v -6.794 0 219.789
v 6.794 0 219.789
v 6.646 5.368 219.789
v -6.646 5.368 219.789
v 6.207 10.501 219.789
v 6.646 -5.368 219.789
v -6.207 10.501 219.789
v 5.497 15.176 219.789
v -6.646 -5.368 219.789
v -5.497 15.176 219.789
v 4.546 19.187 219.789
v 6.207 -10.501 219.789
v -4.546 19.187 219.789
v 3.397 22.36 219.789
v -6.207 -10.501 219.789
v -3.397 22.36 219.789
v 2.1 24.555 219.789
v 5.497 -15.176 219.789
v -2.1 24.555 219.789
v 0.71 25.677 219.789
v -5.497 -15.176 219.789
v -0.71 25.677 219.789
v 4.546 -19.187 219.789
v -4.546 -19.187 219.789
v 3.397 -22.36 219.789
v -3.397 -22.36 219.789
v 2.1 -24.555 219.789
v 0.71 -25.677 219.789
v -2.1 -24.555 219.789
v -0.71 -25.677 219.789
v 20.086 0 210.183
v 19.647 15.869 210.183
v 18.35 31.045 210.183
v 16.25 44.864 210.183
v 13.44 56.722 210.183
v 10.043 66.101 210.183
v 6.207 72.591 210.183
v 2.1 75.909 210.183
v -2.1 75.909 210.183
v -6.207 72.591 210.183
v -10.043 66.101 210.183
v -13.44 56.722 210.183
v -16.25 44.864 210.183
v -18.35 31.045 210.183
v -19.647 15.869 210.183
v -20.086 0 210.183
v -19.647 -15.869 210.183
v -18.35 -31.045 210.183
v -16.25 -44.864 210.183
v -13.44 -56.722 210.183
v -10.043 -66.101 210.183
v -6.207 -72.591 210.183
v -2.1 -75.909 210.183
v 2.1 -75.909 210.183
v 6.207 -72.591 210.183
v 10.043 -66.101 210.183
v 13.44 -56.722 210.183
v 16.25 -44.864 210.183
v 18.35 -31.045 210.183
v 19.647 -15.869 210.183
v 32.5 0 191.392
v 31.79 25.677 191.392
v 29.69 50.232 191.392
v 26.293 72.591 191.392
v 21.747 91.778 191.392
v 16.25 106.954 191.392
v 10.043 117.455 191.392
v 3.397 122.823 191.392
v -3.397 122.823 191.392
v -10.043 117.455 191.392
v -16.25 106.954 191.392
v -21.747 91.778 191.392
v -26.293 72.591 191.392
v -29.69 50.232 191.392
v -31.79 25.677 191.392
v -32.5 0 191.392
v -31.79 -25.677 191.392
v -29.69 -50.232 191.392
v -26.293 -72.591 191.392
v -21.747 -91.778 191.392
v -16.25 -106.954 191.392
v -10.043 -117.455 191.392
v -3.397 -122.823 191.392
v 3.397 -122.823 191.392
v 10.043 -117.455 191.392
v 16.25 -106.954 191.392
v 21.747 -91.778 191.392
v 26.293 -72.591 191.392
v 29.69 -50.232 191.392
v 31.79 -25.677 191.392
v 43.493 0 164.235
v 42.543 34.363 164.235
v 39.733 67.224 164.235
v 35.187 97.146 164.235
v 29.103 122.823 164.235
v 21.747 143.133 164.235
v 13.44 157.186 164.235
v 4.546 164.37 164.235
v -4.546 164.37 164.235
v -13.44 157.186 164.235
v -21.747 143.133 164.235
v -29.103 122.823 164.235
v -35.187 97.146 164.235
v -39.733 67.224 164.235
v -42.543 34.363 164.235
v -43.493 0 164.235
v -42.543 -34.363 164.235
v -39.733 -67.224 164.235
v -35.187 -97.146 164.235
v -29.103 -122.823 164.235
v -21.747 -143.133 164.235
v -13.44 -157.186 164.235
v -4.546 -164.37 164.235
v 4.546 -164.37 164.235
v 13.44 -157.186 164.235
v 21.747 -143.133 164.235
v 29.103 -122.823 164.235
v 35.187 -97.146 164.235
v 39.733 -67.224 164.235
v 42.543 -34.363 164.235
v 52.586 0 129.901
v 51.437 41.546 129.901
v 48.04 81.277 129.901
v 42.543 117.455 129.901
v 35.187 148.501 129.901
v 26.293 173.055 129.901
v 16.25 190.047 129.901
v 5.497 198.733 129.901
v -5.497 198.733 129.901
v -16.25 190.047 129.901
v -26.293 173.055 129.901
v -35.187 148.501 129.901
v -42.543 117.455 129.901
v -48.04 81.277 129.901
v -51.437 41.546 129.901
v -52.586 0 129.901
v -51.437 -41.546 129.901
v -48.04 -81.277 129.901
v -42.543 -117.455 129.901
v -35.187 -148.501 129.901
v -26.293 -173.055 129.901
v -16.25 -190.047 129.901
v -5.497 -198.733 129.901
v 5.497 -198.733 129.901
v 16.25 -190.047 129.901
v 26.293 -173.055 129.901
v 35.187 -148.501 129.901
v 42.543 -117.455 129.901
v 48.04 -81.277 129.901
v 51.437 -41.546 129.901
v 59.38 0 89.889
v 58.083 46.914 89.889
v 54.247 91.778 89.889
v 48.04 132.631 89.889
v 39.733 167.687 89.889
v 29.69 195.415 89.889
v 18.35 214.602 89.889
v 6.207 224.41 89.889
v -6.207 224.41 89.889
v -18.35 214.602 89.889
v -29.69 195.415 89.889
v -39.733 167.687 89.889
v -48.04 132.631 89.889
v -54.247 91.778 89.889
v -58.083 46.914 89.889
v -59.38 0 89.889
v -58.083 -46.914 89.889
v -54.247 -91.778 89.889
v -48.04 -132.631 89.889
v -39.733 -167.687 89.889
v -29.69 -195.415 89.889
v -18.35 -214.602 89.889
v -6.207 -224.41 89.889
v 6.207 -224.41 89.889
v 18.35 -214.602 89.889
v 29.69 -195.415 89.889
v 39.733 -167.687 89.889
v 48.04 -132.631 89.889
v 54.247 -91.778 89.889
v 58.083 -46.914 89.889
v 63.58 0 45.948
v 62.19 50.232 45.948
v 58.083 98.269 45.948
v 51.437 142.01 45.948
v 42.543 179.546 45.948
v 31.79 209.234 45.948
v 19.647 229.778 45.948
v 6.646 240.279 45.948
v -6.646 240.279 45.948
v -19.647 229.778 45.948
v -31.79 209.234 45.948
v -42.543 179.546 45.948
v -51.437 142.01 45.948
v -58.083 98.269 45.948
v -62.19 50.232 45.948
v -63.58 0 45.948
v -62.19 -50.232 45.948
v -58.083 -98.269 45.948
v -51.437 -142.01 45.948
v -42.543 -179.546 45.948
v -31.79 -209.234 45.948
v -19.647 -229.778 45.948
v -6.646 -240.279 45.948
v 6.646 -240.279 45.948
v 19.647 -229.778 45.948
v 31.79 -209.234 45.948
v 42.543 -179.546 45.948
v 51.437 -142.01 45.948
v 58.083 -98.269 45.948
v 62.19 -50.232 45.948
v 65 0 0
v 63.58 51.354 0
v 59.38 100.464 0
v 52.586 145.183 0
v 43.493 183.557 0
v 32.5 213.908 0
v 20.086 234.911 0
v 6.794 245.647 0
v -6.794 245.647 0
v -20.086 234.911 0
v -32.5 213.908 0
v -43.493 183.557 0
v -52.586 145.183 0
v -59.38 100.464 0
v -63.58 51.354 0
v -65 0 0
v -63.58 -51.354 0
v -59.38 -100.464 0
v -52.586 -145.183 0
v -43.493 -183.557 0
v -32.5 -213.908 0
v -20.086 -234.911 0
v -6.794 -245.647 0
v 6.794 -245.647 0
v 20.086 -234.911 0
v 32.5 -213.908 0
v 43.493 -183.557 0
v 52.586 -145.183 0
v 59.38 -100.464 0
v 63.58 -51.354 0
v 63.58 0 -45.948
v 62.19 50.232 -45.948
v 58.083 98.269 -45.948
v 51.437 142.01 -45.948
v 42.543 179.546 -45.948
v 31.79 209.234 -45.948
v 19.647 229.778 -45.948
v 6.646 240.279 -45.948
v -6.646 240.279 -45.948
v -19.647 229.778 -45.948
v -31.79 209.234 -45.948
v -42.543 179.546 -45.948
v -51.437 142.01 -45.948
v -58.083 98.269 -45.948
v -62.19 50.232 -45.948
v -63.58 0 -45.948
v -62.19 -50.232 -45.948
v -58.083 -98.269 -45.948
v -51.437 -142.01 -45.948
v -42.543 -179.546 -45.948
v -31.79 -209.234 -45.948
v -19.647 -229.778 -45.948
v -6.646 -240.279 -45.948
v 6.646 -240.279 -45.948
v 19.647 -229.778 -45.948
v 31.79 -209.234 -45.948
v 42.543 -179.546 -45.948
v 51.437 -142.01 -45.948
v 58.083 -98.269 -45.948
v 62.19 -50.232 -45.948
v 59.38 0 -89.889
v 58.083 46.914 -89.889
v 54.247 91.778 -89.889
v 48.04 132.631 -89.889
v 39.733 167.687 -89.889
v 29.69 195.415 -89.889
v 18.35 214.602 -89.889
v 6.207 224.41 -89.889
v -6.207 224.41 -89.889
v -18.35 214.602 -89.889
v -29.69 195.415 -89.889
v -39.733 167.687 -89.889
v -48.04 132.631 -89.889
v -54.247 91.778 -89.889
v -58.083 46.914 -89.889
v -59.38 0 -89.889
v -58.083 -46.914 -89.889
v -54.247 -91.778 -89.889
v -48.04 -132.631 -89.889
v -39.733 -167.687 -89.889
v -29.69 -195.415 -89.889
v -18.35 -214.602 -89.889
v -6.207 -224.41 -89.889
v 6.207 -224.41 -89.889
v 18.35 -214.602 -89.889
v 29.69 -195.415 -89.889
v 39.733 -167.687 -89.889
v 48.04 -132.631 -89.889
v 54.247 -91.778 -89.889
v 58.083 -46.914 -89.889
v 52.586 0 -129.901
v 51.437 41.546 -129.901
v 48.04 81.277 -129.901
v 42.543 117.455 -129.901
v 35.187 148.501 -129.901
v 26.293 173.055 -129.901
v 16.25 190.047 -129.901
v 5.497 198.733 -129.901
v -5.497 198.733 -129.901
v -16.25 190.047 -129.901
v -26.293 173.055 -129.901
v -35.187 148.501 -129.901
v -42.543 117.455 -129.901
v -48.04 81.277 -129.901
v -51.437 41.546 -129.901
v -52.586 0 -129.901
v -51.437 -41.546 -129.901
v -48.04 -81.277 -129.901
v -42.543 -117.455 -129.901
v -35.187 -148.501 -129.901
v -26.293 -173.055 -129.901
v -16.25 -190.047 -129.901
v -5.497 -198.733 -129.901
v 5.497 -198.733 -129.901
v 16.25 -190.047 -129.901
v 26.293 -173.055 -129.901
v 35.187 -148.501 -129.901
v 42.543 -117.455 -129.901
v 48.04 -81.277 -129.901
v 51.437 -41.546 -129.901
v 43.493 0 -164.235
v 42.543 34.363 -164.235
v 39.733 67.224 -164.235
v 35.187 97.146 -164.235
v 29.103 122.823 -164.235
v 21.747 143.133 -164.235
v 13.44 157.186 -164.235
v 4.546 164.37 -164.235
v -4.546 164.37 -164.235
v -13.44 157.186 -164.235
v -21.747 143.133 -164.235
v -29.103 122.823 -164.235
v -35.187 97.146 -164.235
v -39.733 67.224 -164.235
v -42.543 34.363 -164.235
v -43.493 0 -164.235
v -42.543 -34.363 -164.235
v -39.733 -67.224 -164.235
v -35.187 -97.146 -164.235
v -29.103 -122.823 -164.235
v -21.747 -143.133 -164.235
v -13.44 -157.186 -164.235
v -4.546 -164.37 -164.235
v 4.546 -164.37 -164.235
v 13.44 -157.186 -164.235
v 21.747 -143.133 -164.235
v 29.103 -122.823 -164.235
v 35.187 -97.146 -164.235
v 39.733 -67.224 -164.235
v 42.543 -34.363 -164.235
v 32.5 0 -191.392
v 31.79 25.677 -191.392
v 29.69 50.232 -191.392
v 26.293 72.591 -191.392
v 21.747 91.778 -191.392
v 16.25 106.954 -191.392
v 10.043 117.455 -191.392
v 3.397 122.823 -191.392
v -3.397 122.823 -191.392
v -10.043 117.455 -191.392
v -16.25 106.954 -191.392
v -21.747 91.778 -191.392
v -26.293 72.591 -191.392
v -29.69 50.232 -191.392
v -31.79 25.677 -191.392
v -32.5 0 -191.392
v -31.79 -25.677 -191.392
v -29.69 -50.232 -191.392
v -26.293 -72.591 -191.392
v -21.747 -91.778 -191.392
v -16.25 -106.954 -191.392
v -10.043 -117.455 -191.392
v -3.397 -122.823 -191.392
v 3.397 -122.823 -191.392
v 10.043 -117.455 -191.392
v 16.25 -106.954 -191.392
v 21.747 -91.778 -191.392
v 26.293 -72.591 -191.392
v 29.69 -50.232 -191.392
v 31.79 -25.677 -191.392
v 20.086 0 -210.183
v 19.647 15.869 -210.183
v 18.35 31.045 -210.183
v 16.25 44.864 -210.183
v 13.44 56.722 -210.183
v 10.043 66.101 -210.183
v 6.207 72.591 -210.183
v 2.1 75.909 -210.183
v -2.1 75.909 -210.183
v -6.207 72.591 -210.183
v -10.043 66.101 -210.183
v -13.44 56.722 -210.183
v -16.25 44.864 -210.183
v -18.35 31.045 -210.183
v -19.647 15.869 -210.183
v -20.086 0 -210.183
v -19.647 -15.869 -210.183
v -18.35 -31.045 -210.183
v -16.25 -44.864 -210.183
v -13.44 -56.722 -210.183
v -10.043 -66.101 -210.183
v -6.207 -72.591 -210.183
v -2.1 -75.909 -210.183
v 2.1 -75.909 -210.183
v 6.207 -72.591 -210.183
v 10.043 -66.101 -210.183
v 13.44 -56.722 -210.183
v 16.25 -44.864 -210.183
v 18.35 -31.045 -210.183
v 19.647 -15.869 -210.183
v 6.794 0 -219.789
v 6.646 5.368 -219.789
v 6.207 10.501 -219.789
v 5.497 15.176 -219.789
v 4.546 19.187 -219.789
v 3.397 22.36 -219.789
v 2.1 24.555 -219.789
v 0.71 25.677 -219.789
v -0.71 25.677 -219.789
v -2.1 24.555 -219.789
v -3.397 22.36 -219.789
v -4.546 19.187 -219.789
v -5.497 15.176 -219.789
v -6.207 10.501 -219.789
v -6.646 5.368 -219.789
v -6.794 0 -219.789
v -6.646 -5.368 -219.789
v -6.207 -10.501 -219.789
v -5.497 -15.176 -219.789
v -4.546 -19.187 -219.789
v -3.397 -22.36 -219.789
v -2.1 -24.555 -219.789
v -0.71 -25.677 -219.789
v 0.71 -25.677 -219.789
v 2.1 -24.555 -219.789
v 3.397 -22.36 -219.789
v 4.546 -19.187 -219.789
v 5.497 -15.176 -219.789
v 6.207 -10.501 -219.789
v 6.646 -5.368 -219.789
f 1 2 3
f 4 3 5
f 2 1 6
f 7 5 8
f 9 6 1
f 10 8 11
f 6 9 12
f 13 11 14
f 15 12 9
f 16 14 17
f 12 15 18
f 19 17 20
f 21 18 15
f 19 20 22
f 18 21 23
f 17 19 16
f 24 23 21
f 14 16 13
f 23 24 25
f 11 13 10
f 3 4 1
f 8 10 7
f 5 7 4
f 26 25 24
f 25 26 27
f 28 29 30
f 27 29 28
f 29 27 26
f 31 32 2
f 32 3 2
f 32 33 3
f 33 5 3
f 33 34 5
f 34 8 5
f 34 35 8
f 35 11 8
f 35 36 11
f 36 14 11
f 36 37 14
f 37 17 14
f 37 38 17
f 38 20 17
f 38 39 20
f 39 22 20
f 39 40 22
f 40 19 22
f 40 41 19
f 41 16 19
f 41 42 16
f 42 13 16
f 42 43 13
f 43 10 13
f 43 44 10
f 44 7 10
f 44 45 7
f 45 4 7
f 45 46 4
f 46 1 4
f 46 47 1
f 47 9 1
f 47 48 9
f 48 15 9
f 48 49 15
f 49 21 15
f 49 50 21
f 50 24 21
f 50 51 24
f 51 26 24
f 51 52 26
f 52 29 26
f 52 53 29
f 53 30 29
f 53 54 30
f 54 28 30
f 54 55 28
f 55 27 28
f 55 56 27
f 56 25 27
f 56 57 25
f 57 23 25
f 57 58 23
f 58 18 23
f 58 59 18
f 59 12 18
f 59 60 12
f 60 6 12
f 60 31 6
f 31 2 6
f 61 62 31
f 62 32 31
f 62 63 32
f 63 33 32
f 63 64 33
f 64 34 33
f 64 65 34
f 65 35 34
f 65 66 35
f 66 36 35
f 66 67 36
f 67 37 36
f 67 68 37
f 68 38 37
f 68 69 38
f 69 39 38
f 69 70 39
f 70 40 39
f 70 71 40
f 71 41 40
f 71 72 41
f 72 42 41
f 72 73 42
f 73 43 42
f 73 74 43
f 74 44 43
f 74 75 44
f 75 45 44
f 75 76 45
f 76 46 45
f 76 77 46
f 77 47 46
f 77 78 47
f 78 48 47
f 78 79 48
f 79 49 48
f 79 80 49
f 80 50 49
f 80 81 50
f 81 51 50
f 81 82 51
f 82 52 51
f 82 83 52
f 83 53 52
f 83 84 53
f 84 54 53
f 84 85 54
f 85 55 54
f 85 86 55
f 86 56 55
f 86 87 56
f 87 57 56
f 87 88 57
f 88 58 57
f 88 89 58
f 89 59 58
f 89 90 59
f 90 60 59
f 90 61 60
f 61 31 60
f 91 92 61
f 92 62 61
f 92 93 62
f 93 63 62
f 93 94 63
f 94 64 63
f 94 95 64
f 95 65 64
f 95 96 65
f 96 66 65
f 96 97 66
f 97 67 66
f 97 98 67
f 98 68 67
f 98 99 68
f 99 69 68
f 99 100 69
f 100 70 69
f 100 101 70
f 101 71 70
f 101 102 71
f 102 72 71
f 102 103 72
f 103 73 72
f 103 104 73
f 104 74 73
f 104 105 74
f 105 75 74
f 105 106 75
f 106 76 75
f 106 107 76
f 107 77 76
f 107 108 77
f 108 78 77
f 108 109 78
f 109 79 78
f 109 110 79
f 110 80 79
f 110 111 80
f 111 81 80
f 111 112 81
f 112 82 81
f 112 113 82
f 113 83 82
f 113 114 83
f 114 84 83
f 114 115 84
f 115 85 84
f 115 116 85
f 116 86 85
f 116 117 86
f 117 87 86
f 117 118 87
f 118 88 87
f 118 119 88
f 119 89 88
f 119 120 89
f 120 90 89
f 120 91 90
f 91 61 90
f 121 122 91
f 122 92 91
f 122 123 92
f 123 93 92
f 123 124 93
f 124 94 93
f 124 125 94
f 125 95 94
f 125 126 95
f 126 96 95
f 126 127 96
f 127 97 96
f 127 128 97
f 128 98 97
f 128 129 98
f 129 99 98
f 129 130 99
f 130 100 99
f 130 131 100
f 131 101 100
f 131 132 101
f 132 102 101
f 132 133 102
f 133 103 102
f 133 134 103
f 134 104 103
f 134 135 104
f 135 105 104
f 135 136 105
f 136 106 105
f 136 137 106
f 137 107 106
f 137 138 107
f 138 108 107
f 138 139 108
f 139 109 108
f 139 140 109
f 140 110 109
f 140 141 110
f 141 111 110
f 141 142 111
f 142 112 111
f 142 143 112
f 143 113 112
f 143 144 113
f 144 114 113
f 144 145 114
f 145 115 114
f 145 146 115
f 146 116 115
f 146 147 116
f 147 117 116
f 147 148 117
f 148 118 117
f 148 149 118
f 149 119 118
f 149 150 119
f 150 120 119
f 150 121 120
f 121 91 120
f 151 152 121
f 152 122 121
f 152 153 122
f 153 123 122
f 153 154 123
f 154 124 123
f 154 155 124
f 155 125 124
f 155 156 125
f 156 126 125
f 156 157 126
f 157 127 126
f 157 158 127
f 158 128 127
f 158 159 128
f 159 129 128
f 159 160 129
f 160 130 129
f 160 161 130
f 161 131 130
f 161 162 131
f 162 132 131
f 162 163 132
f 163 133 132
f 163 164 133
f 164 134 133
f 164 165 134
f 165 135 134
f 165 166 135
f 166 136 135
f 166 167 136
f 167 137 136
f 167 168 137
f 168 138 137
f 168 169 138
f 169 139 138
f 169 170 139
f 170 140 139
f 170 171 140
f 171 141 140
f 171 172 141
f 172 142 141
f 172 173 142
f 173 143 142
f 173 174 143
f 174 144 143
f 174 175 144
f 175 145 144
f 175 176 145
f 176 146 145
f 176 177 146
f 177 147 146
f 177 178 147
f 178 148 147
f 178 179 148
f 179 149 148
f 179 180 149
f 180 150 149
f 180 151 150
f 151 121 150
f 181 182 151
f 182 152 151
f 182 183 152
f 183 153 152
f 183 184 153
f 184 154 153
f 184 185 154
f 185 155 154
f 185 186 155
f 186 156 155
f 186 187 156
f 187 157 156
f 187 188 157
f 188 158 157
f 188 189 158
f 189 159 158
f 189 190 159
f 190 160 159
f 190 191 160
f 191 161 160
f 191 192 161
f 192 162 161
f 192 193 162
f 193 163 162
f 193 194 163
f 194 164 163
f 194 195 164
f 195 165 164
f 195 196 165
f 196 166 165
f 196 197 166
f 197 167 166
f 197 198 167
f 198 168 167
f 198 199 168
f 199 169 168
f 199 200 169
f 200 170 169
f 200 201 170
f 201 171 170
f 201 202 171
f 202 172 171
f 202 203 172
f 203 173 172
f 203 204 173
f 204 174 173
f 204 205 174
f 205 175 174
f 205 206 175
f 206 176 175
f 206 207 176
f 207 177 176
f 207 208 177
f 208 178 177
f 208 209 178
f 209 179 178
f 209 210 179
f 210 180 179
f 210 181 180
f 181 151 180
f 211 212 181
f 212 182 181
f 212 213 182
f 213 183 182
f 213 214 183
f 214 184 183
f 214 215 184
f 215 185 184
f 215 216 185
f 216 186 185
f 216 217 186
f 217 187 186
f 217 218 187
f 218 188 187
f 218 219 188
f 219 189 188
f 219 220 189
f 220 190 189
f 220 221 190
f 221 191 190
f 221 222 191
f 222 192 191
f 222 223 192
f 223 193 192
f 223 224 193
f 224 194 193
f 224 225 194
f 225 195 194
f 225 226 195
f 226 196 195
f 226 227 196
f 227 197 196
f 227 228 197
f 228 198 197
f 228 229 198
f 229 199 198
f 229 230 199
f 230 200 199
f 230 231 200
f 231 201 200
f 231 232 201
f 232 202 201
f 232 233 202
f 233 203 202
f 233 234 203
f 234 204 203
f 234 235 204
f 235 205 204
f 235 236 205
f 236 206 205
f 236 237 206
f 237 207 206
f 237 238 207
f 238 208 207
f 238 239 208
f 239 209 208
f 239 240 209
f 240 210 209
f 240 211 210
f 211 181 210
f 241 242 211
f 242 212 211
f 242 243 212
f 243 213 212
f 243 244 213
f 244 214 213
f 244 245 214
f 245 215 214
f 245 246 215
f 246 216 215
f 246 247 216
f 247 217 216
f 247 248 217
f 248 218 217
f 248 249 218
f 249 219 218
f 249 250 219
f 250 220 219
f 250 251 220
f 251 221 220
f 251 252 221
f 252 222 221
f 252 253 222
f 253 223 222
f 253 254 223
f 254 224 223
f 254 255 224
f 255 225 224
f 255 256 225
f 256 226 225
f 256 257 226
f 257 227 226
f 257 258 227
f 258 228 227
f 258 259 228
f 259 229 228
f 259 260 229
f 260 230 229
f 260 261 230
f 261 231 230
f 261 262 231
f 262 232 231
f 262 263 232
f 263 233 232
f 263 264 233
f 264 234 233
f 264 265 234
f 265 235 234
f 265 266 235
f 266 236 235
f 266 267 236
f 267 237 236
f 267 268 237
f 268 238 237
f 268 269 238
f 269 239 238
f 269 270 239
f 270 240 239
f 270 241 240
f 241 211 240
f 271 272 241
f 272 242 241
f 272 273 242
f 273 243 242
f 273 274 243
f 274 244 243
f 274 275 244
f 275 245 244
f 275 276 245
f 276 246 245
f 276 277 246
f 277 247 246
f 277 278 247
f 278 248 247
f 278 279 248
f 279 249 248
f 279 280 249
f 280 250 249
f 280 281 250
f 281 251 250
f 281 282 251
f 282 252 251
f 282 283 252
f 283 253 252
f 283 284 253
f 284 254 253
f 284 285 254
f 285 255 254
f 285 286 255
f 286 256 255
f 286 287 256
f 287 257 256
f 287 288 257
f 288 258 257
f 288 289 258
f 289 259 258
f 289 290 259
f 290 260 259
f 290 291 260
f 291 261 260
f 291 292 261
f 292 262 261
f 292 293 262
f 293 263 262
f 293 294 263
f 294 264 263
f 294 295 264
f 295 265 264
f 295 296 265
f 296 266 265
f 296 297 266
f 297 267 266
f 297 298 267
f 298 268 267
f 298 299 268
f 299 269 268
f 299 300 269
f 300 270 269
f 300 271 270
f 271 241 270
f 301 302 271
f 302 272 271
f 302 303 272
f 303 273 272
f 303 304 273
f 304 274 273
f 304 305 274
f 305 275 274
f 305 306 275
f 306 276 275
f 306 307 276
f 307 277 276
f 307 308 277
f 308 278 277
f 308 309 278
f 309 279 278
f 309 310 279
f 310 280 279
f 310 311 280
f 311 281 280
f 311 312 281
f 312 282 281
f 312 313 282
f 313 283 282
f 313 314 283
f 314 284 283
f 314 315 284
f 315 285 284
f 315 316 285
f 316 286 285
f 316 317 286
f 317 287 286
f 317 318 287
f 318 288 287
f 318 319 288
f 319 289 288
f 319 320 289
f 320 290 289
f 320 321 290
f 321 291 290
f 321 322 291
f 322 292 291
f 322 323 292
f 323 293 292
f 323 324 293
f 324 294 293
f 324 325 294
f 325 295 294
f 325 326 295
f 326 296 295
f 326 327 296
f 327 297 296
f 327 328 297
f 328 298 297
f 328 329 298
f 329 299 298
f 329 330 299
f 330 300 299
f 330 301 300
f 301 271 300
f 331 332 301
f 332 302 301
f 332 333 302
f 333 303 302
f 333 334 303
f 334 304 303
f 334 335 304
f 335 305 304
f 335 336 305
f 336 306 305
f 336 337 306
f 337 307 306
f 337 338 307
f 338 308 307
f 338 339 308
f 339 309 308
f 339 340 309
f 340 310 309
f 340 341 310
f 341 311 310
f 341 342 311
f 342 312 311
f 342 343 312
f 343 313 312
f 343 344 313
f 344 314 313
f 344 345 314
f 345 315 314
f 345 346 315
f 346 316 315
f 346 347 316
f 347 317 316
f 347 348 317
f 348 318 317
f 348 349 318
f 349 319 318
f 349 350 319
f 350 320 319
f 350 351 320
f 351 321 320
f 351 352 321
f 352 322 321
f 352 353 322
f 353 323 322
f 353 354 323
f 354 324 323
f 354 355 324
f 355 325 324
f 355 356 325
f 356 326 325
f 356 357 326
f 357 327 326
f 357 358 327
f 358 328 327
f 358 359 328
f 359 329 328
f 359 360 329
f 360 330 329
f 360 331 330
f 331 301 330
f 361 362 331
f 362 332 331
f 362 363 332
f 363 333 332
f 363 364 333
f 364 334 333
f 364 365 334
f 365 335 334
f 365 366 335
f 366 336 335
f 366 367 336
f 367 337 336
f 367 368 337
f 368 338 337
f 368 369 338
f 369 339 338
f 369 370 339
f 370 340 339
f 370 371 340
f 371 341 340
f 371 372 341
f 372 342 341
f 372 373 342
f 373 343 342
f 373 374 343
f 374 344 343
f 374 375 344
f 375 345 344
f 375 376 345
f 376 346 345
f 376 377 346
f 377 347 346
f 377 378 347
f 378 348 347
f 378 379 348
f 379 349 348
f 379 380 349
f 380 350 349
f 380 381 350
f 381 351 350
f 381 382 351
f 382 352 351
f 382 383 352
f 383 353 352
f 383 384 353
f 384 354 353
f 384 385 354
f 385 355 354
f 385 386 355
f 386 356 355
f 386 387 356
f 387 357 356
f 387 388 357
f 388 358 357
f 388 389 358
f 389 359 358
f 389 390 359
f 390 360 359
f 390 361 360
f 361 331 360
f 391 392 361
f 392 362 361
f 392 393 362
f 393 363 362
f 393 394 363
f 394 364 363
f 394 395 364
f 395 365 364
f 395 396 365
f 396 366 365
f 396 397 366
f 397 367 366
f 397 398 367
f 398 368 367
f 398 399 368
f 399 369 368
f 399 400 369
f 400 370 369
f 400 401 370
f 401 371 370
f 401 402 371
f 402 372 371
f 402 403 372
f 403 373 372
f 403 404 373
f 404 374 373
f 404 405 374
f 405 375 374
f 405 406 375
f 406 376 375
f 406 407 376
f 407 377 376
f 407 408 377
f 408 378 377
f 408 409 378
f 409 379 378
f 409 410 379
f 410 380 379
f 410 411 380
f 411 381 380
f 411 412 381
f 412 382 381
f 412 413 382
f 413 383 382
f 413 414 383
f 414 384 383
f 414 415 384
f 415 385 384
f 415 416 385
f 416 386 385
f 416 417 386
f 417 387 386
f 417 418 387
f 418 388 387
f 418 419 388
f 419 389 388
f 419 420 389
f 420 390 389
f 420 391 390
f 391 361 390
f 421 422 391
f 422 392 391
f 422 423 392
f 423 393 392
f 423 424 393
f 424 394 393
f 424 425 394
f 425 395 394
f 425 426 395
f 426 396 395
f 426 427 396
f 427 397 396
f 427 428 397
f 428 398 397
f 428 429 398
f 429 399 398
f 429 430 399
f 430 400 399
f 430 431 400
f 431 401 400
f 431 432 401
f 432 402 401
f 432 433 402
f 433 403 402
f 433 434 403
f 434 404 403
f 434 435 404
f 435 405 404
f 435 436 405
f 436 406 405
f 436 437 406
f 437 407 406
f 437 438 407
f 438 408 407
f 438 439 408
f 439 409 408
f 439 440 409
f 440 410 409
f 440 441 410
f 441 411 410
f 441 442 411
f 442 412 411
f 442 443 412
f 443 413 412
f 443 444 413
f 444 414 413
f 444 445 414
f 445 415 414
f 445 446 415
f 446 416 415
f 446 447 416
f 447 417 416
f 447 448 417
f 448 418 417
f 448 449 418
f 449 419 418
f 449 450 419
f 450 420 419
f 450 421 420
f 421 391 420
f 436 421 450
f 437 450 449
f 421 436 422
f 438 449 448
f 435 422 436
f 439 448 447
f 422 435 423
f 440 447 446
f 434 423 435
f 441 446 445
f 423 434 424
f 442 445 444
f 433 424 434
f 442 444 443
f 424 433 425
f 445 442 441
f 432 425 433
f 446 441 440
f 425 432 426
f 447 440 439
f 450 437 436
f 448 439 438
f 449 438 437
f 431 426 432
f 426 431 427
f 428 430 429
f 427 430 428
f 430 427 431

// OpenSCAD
// Generated by SolidPython 1.0.1 on 2020-07-29 00:46:47


scale(v = [5, 19, 17]) {
	sphere(r = 13);
}
/***********************************************
*********      SolidPython code:      **********
************************************************
 
# import packages: SolidPython
from solid import *
from solid.utils import *
from itertools import chain, combinations, permutations


class Resize:

    def __init__(self, scad_file):
        self.scad_file = scad_file
        #self.scad_file = import_scad(scad_file)
        # cone/cylinder param:
        self.r1 = 0
        self.r2 = 0
        self.h = 0
        # rectangular prism param:
        self.w = 0
        self.l = 0
        # ellipse param:
        self.r = 0

    # import OpenScad code (file name corresponds to shape)


    # classify shape + parameters
    def assign(self, param1, param2, param3):
        if self.scad_file == 'cone.scad':
            self.r1 = param1
            self.r2 = param2
            self.h = param3
        elif self.scad_file == 'cylinder.scad':
            self.r1 = param1
            self.r2 = param2
            self.h = param3
        elif self.scad_file == 'rectangularPrism.scad':
            self.h = param1
            self.l = param2
            self.w = param3
        else:
            self.r = param1
            self.h = param2

    # resize parameters
    def iterate(self):
        x = range(3, 20, 2)
        i = 1
        if self.scad_file == 'cone.scad':
            tempList = list(permutations(x, 2))
            for temp in tempList:
                param1 = temp[0]
                param2 = temp[1]
                filepath = 'produced_scad_files/' + 'cone' + str(param1) + '_' + str(param2) + '_' + '.scad'
                scad_render_to_file(cylinder(h=param1, r1=param2, r2=0), filepath)

        elif self.scad_file == 'cylinder.scad':
            tempList = list(permutations(x, 3))
            for temp in tempList:
                param1 = temp[0]
                param2 = temp[1]
                filepath = 'produced_scad_files/' + 'cylinder' + str(param1) + '_' + str(param2) + '_' + '.scad'
                scad_render_to_file(cylinder(h=param1, r1=param2, r2=param2), filepath)

        elif self.scad_file == 'rectangularPrism.scad':
            tempList = list(permutations(x, 3))
            for temp in tempList:
                param1 = temp[0]
                param2 = temp[1]
                param3 = temp[2]
                filepath = 'produced_scad_files/' + 'rectangularPrism' + str(param1) + '_' + str(param2) + '_' + str(
                    param3) + '.scad'
                scad_render_to_file(cube(size=(param1, param2, param3)), filepath)

        elif self.scad_file == 'ellipse.scad':
            tempList = list(permutations(x, 4))
            for temp in tempList:
                param1 = temp[0]
                param2 = temp[1]
                param3 = temp[2]
                param4 = temp[3]
                filepath = 'produced_scad_files/' + 'ellipse' + str(param1) + '_' + str(param2) + '_' + str(param3) + '_' + str(param4) + '.scad'
                scad_render_to_file(scale([param1, param2, param3])(sphere(r=param4)), filepath)

    def render_to_scadfile(self):
        scad_render_to_file(scad, 'example.scad') 
 
************************************************/
